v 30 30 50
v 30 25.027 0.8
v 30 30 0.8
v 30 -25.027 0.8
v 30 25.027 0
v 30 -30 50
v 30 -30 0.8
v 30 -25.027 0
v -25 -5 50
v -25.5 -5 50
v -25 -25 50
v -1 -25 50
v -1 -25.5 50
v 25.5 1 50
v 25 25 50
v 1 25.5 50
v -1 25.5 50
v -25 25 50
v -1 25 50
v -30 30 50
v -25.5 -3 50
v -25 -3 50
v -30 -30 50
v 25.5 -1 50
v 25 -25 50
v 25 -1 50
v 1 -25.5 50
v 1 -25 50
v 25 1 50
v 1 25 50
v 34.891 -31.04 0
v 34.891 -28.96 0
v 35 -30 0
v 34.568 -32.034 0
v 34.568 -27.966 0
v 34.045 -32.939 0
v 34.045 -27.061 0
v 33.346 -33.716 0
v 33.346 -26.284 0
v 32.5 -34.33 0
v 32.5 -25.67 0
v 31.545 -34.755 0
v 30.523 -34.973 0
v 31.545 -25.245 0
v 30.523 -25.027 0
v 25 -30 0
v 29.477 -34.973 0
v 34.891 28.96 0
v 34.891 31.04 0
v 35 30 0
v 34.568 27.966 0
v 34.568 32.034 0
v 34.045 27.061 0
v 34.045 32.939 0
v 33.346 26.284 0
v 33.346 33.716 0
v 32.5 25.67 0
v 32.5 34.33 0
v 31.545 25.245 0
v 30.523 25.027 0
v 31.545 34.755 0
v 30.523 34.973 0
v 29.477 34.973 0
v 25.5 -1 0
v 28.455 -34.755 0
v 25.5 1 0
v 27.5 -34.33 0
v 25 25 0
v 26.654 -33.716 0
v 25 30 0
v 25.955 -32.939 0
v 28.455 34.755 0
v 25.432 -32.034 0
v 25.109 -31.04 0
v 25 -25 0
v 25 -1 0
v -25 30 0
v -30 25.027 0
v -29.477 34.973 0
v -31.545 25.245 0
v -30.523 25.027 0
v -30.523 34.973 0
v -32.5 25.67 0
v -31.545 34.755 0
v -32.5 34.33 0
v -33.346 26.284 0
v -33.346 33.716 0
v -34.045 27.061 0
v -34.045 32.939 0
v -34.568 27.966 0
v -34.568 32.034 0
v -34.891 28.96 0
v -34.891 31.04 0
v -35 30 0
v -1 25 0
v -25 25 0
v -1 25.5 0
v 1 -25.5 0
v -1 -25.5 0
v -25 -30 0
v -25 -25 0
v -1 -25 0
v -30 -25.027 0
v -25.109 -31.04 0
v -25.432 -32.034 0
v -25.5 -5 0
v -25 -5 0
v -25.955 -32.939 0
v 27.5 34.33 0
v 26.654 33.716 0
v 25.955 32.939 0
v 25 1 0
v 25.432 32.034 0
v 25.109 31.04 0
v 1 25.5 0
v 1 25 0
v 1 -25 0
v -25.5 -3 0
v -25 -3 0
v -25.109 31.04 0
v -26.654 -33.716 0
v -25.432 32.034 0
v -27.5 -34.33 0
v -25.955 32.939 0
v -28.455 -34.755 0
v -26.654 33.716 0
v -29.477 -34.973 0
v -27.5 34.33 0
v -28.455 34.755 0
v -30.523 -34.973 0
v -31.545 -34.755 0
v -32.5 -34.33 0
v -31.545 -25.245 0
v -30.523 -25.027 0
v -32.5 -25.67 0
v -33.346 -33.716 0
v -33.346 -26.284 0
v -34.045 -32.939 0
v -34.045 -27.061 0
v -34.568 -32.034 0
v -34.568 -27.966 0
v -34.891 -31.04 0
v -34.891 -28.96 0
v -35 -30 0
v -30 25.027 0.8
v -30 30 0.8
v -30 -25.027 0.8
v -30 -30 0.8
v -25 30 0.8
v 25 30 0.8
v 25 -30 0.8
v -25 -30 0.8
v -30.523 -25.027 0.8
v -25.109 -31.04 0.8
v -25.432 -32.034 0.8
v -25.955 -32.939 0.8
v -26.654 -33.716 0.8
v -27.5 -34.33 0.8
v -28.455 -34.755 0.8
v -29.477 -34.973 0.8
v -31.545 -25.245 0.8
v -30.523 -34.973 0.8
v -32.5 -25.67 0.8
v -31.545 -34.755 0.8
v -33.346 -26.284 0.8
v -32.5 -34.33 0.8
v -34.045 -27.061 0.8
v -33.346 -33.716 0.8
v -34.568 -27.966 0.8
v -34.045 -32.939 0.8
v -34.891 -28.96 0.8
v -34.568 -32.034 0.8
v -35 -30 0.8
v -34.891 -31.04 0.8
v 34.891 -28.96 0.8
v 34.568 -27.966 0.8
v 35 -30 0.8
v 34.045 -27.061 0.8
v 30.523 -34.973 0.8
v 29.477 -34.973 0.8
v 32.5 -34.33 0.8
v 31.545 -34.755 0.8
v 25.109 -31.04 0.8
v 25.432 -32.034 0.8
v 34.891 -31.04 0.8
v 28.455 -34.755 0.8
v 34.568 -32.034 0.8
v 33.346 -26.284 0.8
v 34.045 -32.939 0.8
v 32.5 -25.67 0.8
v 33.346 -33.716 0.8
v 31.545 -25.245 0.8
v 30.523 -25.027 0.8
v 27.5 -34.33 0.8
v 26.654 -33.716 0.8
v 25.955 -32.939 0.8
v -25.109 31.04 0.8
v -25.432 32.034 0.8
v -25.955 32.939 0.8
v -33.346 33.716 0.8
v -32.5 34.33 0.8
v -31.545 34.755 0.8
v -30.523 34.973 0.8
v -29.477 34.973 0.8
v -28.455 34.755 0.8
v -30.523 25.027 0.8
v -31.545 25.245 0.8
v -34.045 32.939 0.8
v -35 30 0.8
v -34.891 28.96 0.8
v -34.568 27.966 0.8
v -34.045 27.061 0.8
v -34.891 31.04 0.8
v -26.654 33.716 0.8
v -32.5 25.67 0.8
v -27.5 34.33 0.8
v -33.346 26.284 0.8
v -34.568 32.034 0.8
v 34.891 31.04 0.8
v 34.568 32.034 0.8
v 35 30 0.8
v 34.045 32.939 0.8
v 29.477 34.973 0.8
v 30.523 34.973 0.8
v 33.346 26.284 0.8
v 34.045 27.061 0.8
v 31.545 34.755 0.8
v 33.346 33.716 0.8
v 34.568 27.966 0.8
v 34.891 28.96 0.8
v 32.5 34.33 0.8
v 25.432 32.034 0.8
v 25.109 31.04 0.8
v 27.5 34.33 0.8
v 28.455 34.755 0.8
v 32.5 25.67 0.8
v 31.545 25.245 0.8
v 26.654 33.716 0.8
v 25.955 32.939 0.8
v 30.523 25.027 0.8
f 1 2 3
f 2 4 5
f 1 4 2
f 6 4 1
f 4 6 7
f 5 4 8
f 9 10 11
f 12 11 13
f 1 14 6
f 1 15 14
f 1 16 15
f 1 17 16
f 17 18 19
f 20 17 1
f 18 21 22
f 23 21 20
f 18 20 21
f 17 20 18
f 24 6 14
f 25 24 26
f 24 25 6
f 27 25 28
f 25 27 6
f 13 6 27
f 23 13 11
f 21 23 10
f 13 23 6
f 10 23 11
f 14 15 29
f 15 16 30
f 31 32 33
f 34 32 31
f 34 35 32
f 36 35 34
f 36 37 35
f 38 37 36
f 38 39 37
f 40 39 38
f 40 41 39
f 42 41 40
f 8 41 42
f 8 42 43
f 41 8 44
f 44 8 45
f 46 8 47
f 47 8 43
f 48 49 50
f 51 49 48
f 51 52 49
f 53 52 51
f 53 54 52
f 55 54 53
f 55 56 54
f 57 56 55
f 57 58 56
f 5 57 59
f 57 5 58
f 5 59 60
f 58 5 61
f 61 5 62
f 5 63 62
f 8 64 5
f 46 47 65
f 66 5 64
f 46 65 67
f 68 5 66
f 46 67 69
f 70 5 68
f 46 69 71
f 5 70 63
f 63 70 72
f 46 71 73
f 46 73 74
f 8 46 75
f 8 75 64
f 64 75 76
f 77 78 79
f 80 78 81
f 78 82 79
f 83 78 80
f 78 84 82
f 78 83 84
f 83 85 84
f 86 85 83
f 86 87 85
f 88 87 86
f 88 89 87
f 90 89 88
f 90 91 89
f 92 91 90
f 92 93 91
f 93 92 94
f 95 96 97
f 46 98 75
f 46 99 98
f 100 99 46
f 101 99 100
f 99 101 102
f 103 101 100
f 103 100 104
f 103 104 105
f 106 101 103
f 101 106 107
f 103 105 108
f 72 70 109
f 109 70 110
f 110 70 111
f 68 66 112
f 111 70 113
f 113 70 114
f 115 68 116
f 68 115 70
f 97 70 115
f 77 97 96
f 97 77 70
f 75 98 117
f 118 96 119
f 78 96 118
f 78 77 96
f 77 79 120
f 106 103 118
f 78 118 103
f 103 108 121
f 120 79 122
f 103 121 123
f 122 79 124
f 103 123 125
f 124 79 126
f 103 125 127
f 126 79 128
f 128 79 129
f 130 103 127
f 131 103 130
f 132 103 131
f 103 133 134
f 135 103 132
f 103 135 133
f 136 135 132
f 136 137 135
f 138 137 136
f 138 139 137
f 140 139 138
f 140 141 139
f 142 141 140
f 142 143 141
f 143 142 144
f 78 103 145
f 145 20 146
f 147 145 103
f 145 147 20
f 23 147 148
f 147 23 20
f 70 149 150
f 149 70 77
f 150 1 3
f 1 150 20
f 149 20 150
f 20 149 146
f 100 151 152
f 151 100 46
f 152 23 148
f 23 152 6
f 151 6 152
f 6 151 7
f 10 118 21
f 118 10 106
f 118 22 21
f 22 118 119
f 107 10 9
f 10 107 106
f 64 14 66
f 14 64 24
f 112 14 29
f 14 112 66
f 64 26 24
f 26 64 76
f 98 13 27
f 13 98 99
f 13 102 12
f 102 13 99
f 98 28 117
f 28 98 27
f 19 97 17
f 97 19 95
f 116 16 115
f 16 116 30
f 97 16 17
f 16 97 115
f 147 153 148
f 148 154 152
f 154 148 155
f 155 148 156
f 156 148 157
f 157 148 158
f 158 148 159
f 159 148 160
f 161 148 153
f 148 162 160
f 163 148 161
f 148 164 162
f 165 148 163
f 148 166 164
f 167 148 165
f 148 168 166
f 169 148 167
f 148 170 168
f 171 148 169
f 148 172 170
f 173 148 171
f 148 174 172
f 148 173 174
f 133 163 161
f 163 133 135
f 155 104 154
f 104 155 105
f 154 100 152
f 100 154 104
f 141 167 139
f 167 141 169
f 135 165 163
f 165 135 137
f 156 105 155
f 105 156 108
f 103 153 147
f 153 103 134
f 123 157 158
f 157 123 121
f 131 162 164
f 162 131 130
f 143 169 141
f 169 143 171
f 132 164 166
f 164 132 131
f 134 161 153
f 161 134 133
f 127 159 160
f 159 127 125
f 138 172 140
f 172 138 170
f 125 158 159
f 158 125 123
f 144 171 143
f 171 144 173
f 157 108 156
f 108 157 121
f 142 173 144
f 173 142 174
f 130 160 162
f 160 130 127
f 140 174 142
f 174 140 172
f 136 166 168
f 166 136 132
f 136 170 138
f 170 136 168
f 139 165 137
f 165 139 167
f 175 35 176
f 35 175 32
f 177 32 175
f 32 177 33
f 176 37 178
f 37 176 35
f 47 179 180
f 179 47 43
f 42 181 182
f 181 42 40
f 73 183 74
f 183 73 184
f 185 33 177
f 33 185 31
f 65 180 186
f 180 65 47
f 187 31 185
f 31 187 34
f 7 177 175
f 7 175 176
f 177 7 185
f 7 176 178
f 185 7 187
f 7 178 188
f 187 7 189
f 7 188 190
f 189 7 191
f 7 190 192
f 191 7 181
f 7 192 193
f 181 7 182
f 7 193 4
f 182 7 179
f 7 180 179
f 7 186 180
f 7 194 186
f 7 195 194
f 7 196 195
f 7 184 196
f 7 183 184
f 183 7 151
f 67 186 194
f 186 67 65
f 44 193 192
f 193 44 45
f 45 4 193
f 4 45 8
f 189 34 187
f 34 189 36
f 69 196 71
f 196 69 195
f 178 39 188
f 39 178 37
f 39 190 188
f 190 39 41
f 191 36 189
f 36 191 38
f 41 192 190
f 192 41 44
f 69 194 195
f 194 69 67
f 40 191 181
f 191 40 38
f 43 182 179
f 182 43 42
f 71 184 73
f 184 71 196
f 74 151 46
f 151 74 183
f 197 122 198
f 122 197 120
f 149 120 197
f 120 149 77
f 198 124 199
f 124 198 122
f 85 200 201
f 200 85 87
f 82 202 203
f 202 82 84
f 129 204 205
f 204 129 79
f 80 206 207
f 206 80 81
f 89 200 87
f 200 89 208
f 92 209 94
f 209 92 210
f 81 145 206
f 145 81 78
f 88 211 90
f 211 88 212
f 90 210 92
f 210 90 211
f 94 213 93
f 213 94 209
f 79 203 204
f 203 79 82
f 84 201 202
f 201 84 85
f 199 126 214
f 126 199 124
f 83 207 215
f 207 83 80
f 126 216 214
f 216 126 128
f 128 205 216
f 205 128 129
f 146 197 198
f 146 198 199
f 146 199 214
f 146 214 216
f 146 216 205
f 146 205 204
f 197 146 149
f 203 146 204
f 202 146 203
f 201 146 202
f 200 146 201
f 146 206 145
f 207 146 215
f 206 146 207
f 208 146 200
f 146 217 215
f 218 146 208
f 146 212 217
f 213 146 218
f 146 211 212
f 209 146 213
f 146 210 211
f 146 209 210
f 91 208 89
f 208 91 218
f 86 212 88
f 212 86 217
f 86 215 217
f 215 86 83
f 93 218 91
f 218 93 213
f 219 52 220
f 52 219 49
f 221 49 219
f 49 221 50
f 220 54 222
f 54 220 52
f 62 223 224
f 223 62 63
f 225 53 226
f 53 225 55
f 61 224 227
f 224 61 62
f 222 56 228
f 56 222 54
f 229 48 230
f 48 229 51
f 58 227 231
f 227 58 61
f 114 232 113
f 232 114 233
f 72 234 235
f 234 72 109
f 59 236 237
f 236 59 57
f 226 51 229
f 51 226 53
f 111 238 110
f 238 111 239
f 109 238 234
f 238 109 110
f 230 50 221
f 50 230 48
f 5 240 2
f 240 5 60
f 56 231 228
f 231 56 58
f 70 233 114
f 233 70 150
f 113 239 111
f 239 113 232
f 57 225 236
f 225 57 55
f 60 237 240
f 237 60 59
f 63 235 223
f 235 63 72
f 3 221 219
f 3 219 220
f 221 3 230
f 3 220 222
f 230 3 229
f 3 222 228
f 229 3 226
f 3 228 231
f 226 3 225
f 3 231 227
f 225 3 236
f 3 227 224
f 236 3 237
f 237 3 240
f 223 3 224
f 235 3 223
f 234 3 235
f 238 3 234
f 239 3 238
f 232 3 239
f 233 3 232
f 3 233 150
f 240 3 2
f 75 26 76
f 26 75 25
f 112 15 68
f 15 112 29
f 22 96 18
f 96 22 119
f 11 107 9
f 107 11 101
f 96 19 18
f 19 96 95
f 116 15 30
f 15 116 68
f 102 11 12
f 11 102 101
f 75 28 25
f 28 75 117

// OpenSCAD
// Calibration test tower
//
// Generate STL using OpenSCAD:
//   openscad square_tower.scad -o square_tower.stl
// 
// Pulled from Klipper documentation
// https://github.com/KevinOConnor/klipper/tree/master/docs/prints
//

square_width = 5;
square_size = 60;
square_height = 50;
antiwarp_height = .8;
antiwarp_radius = 5;
CUT = 0.01;

module notch(x, y, rot) {
    depth = .5;
    width = 1;
    translate([x, y, 0])
        rotate([0, 0, rot])
            translate([-depth, -width, -CUT])
                cube([2*depth, 2*width, square_height + 2*CUT]);
}

module square_with_notches() {
    difference() {
        // Start with initial square
        cube([square_size, square_size, square_height]);
        // Remove four notches on inside perimeter
        notch(square_width, square_size/2 - 4, 0);
        notch(square_size - square_width, square_size/2, 0);
        notch(square_size/2, square_width, 90);
        notch(square_size/2, square_size - square_width, 90);
    }
}

module anti_warp_feet() {
    module anti_warp_cylinder() {
        cylinder(r=antiwarp_radius, h=antiwarp_height, $fs=.5);
    }
    //dist = antiwarp_radius / 2.5;
    dist = 0;
    translate([dist, dist, 0])
        anti_warp_cylinder();
    translate([square_size-dist, dist, 0])
        anti_warp_cylinder();
    translate([dist, square_size-dist, 0])
        anti_warp_cylinder();
    translate([square_size-dist, square_size-dist, 0])
        anti_warp_cylinder();
}

module hollow_square() {
    translate([-30, -30, 0]) difference() {
        union() {
            square_with_notches();
            anti_warp_feet();
        }
        translate([square_width, square_width, -CUT])
            cube([square_size-2*square_width, square_size-2*square_width,
                  square_height + 2*CUT]);
    }
}

hollow_square();
